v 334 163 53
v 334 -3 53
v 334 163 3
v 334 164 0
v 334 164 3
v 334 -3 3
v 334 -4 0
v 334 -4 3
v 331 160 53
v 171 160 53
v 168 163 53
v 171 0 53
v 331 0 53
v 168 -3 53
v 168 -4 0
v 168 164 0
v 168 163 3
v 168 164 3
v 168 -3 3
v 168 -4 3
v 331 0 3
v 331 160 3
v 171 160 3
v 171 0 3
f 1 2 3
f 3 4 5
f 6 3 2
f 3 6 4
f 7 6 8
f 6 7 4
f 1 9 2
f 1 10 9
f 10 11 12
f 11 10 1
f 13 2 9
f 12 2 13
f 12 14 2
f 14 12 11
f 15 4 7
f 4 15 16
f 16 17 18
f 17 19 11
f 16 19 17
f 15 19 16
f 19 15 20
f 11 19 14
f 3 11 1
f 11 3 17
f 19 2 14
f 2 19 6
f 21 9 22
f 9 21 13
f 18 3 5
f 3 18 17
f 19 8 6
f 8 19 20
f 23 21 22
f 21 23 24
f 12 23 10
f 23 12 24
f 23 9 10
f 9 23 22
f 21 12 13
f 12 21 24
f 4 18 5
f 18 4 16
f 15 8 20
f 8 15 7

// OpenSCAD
// Title: TrayBox
// Author: http://www.thingiverse.com/Jinja
// Date: 14/9/2012

/////////// START OF PARAMETERS /////////////////

tray_width = 154;
tray_length = 154;
tray_depth = 50;
tray_gap = 0.7;
tray_fit = 0.05;
tray_fit_depth = 5;
wall_size = 0.6*5;
lip_size = 1;

/////////// END OF PARAMETERS /////////////////

// uncomment the pieces you want added...
// inner_tray();
outer_tray();

///////////////////////////////////////////////


base_width = tray_width + 4*wall_size;
base_length = tray_length + (4*wall_size) + (2*lip_size);

module inner_tray()
{
	translate([-wall_size, -wall_size-lip_size, 0] )
	cube( [base_width, base_length, wall_size] );

	difference()
	{
		union()
		{
			translate([tray_fit, tray_fit,0])
			cube( [tray_width+(2*wall_size)-(2*tray_fit), tray_length+(2*wall_size)-(2*tray_fit), tray_fit_depth] );
			translate([tray_gap, tray_gap,0])
			cube( [tray_width+(2*wall_size)-(2*tray_gap), tray_length+(2*wall_size)-(2*tray_gap), tray_depth+wall_size] );
		}
		translate([wall_size,wall_size,wall_size])
		cube( [tray_width, tray_length, tray_depth+0.1] );
	}
}

module outer_tray()
{
	translate( [base_width + 5, 0, 0 ])
	{
		translate([-wall_size, -wall_size-lip_size, 0] )
		cube( [base_width, base_length, wall_size] );
	
		difference()
		{
			union()
			{
				translate([-wall_size, -wall_size, 0] )
				cube( [tray_width+(4*wall_size), tray_length+(4*wall_size), tray_depth+wall_size] );
			}
			translate([0,0,wall_size])
			cube( [tray_width+(2*wall_size), tray_length+(2*wall_size), tray_depth+0.1] );
		}

	}
}
